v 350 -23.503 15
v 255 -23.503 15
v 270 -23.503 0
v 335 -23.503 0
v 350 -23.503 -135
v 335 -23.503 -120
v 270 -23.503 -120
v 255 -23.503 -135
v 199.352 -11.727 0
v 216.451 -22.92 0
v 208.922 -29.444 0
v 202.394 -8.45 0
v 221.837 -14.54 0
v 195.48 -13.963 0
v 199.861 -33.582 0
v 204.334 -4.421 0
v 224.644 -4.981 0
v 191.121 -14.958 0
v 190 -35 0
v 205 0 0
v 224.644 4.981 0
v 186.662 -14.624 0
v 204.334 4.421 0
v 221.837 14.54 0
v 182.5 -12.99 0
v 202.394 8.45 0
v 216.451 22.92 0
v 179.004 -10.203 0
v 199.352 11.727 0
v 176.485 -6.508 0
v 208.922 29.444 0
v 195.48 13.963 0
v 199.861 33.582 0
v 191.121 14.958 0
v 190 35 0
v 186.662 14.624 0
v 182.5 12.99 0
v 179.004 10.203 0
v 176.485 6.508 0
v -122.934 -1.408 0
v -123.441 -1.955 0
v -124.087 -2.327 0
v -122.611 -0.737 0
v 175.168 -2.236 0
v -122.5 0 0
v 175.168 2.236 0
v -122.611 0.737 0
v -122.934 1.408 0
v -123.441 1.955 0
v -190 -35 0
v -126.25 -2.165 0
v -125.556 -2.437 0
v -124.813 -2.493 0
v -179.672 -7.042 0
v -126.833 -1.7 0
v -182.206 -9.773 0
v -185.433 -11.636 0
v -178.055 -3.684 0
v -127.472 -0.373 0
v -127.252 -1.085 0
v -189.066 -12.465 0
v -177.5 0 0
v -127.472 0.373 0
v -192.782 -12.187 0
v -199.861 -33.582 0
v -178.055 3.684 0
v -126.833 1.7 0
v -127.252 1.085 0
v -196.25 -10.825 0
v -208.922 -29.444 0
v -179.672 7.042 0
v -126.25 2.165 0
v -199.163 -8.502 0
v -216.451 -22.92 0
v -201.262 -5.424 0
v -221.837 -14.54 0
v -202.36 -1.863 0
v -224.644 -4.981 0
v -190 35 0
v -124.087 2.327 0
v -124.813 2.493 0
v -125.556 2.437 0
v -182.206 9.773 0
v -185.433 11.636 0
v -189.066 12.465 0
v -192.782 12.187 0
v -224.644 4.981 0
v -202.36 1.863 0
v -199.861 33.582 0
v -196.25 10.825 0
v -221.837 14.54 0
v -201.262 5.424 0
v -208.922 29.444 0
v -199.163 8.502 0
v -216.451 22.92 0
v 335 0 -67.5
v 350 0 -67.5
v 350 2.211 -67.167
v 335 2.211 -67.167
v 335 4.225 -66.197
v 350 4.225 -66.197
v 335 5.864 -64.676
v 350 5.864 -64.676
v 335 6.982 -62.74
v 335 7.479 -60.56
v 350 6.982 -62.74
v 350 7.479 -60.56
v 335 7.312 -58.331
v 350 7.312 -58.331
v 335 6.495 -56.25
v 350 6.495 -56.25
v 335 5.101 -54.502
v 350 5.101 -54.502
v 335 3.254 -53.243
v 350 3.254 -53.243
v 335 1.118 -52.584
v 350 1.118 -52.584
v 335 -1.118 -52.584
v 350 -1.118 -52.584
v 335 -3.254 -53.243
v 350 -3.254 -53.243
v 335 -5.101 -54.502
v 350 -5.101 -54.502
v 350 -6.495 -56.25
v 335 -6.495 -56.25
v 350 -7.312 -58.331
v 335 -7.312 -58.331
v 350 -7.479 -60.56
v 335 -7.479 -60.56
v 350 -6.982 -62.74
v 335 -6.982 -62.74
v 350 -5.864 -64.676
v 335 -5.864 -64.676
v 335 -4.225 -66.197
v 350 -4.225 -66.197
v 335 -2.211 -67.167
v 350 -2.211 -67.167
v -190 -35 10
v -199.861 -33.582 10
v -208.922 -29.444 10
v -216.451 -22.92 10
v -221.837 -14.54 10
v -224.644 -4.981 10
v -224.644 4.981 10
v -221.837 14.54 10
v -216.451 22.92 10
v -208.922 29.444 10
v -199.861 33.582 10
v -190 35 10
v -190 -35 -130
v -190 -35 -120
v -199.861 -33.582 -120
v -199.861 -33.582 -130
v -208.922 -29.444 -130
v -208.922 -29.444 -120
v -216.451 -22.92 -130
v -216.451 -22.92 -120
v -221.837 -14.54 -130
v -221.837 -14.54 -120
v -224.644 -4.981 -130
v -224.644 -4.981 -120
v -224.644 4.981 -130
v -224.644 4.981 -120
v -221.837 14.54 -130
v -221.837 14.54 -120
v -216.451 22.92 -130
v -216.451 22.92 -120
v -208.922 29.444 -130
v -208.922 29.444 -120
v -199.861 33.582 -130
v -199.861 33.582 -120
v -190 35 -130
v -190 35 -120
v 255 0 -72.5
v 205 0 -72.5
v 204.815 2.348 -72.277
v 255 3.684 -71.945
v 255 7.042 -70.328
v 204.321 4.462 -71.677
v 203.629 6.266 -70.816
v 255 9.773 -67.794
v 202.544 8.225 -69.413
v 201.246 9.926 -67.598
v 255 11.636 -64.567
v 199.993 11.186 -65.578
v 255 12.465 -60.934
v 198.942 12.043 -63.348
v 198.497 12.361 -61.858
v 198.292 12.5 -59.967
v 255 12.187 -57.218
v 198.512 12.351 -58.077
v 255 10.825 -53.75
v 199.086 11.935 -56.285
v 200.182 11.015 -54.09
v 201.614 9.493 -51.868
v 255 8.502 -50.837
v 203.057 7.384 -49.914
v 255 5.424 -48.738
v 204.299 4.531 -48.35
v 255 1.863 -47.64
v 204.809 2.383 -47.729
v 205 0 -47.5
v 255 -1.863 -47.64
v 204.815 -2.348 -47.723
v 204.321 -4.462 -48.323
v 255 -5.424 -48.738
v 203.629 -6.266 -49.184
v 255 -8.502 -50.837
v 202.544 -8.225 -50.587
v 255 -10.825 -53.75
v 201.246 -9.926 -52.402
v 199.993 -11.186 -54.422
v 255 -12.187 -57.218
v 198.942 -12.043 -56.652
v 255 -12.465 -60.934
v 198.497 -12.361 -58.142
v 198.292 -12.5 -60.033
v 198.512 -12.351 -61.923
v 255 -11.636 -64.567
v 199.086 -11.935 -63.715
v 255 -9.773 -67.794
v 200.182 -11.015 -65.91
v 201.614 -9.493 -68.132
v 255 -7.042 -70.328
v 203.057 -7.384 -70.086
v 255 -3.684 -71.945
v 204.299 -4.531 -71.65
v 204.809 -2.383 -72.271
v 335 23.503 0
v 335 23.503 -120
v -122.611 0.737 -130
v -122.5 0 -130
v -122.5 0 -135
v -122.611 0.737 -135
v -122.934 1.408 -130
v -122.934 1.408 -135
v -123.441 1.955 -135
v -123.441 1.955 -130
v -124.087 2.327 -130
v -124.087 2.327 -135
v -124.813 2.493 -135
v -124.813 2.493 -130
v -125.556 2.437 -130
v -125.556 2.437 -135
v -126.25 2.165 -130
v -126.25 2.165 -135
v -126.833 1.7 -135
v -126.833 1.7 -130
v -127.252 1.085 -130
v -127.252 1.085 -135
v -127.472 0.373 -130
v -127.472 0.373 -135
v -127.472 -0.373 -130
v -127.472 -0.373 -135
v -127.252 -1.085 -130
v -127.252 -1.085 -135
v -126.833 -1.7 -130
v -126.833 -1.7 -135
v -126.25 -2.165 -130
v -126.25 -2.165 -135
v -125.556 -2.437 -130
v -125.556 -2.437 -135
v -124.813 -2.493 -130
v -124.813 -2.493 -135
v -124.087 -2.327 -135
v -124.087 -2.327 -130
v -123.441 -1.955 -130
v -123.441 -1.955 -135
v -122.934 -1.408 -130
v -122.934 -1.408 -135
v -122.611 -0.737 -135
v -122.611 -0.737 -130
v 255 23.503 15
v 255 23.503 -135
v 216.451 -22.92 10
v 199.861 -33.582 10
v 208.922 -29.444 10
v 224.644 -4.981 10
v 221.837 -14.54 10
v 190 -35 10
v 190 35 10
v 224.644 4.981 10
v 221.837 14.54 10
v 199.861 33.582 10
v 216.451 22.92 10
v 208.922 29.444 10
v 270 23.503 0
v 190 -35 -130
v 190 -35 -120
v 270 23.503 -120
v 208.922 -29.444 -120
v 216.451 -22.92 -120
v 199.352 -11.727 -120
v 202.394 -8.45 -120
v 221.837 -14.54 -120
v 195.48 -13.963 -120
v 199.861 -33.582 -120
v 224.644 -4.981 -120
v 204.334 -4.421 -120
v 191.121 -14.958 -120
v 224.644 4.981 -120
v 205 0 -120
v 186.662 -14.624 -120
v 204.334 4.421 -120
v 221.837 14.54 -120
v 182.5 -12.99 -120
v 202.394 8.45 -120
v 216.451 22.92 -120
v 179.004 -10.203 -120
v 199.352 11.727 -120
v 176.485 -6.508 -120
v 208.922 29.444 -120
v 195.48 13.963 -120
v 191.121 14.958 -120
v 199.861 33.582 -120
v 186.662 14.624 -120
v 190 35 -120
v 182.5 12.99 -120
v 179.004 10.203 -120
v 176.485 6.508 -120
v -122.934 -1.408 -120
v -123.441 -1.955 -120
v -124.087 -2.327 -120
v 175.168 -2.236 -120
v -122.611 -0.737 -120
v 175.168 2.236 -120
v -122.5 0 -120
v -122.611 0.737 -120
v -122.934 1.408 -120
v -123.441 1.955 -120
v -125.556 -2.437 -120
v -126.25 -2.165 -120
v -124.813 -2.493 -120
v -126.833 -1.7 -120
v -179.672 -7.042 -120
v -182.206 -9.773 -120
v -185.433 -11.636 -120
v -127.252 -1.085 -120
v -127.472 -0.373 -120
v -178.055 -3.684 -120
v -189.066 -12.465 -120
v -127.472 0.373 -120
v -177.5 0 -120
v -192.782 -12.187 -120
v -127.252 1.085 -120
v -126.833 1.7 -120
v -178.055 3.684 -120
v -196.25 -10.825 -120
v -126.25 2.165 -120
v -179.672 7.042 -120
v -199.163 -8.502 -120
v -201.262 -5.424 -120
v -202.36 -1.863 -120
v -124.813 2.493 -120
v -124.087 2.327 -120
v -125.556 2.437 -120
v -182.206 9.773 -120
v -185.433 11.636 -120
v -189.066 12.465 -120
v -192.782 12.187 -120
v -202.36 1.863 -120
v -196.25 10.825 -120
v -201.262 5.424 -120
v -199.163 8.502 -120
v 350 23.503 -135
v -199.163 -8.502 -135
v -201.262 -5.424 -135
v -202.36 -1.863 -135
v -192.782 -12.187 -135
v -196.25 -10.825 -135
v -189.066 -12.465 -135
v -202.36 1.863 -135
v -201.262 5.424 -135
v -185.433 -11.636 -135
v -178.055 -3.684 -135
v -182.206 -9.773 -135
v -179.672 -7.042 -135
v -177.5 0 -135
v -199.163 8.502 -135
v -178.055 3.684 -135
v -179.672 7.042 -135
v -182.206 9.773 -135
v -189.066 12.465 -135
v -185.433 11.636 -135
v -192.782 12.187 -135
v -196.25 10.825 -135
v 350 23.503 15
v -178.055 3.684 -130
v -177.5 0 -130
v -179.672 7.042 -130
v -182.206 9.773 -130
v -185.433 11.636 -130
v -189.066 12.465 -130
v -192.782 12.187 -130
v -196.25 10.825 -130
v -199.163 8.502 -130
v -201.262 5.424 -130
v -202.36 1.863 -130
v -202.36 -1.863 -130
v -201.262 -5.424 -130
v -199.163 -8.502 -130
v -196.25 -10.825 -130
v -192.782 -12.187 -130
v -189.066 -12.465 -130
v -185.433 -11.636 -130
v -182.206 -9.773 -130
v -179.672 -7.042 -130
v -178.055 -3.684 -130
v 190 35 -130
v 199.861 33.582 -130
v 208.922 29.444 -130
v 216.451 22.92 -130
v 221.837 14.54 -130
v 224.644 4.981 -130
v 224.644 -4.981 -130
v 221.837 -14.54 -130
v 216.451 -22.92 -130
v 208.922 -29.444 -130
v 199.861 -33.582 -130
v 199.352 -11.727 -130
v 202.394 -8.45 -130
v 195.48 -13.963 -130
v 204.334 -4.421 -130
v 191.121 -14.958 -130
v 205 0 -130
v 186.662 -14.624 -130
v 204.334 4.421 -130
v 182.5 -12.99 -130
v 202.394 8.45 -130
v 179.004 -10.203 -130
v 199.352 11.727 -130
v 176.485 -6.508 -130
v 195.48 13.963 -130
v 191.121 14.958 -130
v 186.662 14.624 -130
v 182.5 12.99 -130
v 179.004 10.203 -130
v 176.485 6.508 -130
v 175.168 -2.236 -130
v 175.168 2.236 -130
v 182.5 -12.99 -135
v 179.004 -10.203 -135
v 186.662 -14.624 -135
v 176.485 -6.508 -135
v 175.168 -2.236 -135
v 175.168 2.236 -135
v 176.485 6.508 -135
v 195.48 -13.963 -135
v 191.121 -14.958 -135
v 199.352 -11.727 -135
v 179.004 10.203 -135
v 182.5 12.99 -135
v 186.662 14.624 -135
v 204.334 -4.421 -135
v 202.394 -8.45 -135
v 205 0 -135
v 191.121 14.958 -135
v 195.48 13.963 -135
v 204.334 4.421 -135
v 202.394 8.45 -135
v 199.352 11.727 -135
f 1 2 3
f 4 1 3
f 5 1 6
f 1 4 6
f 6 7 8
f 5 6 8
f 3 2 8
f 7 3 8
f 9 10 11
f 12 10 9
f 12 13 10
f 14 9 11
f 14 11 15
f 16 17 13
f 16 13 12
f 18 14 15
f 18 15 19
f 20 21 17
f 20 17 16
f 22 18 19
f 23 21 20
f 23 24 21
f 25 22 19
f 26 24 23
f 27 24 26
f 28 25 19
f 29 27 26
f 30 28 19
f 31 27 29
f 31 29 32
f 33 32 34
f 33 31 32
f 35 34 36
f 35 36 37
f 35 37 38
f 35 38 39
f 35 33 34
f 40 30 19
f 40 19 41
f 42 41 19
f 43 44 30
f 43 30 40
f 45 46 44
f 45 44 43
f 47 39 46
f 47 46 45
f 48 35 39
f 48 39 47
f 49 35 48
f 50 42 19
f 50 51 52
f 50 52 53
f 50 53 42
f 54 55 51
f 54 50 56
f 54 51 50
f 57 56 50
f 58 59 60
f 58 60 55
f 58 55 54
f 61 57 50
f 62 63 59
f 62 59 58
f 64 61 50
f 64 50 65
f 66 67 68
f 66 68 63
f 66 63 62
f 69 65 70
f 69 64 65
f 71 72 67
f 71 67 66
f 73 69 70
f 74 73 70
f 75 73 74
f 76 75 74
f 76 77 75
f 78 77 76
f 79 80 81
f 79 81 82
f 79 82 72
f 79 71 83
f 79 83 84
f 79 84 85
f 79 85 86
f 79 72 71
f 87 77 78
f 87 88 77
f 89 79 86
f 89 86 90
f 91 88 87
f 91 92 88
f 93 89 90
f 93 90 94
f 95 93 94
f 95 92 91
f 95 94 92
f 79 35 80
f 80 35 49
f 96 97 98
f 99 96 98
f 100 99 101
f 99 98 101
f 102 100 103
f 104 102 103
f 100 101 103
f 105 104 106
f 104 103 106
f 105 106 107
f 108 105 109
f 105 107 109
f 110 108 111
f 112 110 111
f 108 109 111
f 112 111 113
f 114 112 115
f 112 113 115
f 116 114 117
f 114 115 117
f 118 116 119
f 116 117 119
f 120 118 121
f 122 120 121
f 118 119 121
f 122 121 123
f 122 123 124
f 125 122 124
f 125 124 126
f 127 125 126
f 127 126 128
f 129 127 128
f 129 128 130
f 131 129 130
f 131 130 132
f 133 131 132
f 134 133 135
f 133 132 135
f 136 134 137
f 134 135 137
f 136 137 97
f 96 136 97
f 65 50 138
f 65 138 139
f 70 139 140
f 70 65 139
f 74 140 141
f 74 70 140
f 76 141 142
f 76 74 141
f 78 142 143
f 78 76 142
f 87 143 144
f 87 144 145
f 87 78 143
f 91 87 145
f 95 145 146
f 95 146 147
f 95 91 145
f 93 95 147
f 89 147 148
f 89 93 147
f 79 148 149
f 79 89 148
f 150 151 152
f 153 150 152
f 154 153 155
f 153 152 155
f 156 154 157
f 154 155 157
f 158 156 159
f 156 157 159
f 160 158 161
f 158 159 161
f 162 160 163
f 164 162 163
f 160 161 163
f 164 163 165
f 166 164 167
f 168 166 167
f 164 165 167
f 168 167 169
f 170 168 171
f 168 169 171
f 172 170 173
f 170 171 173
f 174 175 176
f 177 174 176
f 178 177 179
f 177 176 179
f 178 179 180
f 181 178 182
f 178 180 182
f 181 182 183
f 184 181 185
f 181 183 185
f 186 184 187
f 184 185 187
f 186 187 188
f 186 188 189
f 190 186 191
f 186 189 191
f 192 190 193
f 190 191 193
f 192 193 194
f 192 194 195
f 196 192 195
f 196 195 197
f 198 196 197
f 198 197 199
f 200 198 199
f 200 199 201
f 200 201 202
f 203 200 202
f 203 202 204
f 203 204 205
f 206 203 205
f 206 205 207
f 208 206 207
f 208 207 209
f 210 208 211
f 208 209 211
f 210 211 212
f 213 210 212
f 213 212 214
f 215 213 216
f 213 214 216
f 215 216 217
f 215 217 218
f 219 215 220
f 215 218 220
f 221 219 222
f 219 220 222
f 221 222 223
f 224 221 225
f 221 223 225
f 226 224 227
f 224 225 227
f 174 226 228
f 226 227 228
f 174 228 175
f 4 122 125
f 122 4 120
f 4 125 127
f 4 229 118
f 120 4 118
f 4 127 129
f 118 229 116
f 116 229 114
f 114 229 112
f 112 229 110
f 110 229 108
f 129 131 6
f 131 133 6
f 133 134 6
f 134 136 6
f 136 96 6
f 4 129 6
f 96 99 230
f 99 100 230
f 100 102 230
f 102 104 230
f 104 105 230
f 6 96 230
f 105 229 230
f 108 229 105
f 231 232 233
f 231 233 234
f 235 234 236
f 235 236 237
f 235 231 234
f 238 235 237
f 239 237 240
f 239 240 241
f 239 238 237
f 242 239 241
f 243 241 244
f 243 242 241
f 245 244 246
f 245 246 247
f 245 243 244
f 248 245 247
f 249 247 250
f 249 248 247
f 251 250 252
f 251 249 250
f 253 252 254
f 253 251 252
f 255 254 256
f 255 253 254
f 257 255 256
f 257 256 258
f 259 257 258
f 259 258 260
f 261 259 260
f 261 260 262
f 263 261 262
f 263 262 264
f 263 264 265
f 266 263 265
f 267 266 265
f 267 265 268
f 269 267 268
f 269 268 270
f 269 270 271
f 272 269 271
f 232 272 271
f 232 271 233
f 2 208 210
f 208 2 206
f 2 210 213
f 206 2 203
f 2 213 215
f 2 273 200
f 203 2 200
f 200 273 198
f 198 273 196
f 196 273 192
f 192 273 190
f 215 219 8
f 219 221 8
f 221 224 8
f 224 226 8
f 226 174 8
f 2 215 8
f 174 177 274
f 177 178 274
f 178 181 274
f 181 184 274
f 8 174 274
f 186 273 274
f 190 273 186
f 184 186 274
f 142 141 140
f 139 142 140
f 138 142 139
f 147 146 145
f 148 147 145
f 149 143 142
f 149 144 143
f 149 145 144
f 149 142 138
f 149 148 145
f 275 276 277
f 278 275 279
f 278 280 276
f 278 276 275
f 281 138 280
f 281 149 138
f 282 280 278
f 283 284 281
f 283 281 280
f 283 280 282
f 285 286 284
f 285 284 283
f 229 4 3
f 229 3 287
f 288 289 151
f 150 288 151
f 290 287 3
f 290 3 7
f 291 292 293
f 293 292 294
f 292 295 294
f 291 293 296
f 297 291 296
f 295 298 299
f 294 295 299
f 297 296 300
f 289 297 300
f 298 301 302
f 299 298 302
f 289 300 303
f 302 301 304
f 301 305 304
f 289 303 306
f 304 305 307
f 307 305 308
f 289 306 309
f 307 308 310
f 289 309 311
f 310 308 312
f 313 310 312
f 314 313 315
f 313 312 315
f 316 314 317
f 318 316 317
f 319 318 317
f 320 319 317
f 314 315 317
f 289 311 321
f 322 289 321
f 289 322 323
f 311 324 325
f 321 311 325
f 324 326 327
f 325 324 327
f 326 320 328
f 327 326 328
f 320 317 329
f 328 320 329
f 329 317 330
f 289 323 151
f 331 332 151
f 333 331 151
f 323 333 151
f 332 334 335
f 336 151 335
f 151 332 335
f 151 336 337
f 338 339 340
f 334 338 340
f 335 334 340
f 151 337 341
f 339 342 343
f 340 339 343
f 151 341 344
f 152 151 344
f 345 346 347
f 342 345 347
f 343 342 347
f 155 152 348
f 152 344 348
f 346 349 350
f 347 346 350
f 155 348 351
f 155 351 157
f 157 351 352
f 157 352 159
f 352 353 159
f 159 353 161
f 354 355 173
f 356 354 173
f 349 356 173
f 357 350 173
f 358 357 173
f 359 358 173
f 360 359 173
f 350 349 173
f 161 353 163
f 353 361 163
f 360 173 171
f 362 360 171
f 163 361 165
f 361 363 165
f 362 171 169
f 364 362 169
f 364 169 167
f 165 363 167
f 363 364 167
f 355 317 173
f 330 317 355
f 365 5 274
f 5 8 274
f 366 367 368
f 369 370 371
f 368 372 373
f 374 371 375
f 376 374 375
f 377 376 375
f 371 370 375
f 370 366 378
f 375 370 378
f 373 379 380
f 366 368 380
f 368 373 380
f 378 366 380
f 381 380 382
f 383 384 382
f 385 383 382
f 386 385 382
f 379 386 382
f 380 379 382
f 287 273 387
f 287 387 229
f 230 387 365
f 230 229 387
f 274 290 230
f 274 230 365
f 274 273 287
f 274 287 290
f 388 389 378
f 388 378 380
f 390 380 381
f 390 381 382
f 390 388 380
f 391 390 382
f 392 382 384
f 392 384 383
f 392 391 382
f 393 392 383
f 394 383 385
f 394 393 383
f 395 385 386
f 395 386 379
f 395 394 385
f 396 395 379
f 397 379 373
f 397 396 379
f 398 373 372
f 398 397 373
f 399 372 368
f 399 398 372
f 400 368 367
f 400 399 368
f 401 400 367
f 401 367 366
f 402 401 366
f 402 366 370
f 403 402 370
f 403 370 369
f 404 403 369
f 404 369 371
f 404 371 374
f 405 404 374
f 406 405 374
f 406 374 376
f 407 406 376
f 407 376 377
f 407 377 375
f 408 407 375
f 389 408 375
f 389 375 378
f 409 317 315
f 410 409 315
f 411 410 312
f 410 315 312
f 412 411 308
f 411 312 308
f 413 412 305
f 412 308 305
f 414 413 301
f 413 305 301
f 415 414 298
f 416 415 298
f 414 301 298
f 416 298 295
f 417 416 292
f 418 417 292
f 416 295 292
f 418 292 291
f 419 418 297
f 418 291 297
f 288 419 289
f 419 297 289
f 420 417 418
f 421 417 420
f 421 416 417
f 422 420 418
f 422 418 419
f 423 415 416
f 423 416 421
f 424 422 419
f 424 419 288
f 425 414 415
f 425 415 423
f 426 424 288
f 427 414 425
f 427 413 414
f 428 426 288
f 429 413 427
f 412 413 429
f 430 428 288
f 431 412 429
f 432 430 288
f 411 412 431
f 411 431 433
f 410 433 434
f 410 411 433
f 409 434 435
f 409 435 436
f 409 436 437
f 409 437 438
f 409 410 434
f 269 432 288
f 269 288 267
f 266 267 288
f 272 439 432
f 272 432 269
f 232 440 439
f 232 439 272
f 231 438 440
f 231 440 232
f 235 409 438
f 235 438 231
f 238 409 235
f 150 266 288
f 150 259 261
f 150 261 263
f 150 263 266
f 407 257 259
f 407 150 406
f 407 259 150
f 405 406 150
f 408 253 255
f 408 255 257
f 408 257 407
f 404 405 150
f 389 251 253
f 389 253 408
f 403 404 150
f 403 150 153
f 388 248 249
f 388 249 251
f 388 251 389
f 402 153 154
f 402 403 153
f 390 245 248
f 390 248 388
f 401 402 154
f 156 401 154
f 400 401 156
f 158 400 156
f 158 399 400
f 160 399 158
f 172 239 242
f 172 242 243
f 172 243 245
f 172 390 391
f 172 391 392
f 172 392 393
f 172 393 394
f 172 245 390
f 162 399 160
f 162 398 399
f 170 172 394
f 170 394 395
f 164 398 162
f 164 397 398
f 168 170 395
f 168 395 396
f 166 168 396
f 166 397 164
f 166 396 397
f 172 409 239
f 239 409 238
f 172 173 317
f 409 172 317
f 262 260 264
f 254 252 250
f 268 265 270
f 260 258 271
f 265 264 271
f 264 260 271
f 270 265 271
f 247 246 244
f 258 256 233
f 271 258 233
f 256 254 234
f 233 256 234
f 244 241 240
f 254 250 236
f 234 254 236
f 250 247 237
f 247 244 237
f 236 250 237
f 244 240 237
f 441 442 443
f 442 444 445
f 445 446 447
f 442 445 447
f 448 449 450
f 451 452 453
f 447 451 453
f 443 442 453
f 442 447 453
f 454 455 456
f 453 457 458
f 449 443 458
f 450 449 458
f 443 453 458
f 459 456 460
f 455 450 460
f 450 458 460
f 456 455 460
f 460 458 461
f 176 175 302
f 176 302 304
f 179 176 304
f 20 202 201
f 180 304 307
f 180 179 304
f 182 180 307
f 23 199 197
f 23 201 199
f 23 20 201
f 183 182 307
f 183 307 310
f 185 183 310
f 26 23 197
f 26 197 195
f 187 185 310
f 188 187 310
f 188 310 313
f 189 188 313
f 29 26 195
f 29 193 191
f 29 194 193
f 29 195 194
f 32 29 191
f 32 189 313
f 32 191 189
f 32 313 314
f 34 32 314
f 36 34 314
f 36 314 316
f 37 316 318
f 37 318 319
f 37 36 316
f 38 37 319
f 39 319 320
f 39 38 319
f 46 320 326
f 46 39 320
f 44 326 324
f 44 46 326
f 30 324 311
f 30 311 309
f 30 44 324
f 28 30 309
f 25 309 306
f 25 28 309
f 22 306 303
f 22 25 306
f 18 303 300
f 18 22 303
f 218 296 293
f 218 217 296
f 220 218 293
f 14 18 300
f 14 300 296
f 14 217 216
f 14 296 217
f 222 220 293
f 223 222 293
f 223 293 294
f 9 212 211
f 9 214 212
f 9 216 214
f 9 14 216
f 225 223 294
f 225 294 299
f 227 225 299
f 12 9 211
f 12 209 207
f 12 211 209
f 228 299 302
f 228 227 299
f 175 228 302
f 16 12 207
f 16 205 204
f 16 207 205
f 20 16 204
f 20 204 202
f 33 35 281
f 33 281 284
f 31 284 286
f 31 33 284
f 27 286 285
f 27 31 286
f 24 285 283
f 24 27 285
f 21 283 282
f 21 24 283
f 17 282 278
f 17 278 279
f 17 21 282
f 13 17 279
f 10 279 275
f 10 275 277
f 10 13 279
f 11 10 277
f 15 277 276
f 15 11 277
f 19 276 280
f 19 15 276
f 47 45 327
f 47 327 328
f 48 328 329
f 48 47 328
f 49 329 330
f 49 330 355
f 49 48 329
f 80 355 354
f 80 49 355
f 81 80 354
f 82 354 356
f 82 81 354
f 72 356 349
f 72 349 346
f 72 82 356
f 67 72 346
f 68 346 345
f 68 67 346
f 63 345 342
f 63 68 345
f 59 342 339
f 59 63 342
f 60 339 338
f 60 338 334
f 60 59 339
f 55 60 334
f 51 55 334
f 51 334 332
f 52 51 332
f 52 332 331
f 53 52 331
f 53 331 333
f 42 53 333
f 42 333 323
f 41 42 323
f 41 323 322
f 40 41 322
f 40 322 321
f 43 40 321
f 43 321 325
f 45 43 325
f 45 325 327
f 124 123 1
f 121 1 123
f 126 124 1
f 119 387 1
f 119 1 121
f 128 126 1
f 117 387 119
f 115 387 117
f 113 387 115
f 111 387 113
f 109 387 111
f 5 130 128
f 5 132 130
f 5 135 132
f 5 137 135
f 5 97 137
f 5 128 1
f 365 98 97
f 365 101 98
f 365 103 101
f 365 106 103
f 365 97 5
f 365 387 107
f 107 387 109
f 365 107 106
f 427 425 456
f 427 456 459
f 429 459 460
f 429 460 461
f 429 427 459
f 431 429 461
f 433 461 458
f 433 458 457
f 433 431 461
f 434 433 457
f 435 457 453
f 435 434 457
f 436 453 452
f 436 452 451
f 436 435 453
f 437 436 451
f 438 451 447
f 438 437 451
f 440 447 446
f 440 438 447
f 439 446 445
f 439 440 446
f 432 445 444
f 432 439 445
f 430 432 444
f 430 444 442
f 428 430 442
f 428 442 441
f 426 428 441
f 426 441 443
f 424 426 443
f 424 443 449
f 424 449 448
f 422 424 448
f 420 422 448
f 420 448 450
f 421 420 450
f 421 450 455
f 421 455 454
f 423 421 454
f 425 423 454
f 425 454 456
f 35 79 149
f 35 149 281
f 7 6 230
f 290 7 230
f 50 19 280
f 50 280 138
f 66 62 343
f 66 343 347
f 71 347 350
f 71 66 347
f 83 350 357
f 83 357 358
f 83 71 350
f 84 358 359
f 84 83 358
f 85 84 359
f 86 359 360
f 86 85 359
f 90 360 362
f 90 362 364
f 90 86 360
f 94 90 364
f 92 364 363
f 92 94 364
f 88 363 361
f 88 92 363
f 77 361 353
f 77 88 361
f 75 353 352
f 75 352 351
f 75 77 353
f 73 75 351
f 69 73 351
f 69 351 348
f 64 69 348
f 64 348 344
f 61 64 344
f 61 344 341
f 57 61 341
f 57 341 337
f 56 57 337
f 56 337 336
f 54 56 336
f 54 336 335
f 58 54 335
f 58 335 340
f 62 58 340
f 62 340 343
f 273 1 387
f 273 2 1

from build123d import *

# Parameters (mm, degrees)
BOSS_EXTRUDE1_DEPTH = 10
BOSS_EXTRUDE2_DEPTH = 10
SKETCH3_R           = 12.5
BOSS_EXTRUDE3_DEPTH = 145
SKETCH4_R           = 2.5
BOSS_EXTRUDE4_DEPTH = 145
SKETCH5_R           = 15
BOSS_EXTRUDE5_DEPTH = 145
SKETCH6_R           = 12.5
BOSS_EXTRUDE6_DEPTH = 65
SKETCH7_W           = 150
SKETCH7_H           = 47.005771534
BOSS_EXTRUDE7_DEPTH = 15
SKETCH9_W           = 15
SKETCH9_H           = 47.005771534
BOSS_EXTRUDE8_DEPTH = 65
SKETCH10_W          = 150
SKETCH10_H          = 47.005771534
BOSS_EXTRUDE9_DEPTH = 15
SKETCH11_R          = 7.5
CUT_EXTRUDE1_DEPTH  = 15


with BuildPart() as part:
    # Sketch1 → Boss-Extrude1 (new body)
    with BuildSketch(Plane.XY):
        with BuildLine():
            Line((-190, 35), (190, 35))
            ThreePointArc((190, 35), (225, 0), (190, -35))
            Line((190, -35), (-190, -35))
            ThreePointArc((-190, -35), (-225, 0), (-190, 35))
        make_face()
    extrude(amount=BOSS_EXTRUDE1_DEPTH)



with BuildPart() as body_2:
    # Sketch2 → Boss-Extrude2 (new body)
    with BuildSketch(Plane.XY.offset(-120)):
        with BuildLine():
            Line((-190, 35), (190, 35))
            ThreePointArc((190, 35), (225, 0), (190, -35))
            Line((190, -35), (-190, -35))
            ThreePointArc((-190, -35), (-225, 0), (-190, 35))
        make_face()
    extrude(amount=-BOSS_EXTRUDE2_DEPTH)


with BuildPart() as part_1:
    add(part.part)

    add(body_2.part)  # Boss-Extrude3 merges body 2
    # Sketch3 → Boss-Extrude3 (add)
    with BuildSketch(Plane.XY.offset(10)):
        with Locations((-190, 0)):
            Circle(SKETCH3_R)
    extrude(amount=-BOSS_EXTRUDE3_DEPTH)

    # Sketch4 → Boss-Extrude4 (add)
    with BuildSketch(Plane.XY.offset(10)):
        with Locations((-125, 0)):
            Circle(SKETCH4_R)
    extrude(amount=-BOSS_EXTRUDE4_DEPTH)

    # Sketch5 → Boss-Extrude5 (add)
    with BuildSketch(Plane.XY.offset(10)):
        with Locations((190, 0)):
            Circle(SKETCH5_R)
    extrude(amount=-BOSS_EXTRUDE5_DEPTH)

    # Sketch6 → Boss-Extrude6 (add)
    with BuildSketch(Plane(origin=(190, 0, 0), x_dir=(0, 0, -1), z_dir=(1, 0, 0))):
        with Locations((60, 0)):
            Circle(SKETCH6_R)
    extrude(amount=BOSS_EXTRUDE6_DEPTH)

    # Sketch7 → Boss-Extrude7 (add)
    with BuildSketch(Plane(origin=(255, 0, 0), x_dir=(0, 0, -1), z_dir=(1, 0, 0))):
        with Locations((60, 0)):
            Rectangle(SKETCH7_W, SKETCH7_H)
    extrude(amount=BOSS_EXTRUDE7_DEPTH)

    # Sketch9 → Boss-Extrude8 (add)
    with BuildSketch(Plane(origin=(270, 0, 0), x_dir=(0, 0, -1), z_dir=(1, 0, 0))):
        with Locations((-7.5, 0)):
            Rectangle(SKETCH9_W, SKETCH9_H)
        with Locations((127.5, 0)):
            Rectangle(SKETCH9_W, SKETCH9_H)
    extrude(amount=BOSS_EXTRUDE8_DEPTH)

    # Sketch10 → Boss-Extrude9 (add)
    with BuildSketch(Plane(origin=(335, 0, 0), x_dir=(0, 0, -1), z_dir=(1, 0, 0))):
        with Locations((60, 0)):
            Rectangle(SKETCH10_W, SKETCH10_H)
    extrude(amount=BOSS_EXTRUDE9_DEPTH)

    # Sketch11 → Cut-Extrude1 (cut)
    with BuildSketch(Plane(origin=(350, 0, 0), x_dir=(0, 0, -1), z_dir=(1, 0, 0))):
        with Locations((60, 0)):
            Circle(SKETCH11_R)
    extrude(amount=-CUT_EXTRUDE1_DEPTH, mode=Mode.SUBTRACT)


solid = part_1.part
